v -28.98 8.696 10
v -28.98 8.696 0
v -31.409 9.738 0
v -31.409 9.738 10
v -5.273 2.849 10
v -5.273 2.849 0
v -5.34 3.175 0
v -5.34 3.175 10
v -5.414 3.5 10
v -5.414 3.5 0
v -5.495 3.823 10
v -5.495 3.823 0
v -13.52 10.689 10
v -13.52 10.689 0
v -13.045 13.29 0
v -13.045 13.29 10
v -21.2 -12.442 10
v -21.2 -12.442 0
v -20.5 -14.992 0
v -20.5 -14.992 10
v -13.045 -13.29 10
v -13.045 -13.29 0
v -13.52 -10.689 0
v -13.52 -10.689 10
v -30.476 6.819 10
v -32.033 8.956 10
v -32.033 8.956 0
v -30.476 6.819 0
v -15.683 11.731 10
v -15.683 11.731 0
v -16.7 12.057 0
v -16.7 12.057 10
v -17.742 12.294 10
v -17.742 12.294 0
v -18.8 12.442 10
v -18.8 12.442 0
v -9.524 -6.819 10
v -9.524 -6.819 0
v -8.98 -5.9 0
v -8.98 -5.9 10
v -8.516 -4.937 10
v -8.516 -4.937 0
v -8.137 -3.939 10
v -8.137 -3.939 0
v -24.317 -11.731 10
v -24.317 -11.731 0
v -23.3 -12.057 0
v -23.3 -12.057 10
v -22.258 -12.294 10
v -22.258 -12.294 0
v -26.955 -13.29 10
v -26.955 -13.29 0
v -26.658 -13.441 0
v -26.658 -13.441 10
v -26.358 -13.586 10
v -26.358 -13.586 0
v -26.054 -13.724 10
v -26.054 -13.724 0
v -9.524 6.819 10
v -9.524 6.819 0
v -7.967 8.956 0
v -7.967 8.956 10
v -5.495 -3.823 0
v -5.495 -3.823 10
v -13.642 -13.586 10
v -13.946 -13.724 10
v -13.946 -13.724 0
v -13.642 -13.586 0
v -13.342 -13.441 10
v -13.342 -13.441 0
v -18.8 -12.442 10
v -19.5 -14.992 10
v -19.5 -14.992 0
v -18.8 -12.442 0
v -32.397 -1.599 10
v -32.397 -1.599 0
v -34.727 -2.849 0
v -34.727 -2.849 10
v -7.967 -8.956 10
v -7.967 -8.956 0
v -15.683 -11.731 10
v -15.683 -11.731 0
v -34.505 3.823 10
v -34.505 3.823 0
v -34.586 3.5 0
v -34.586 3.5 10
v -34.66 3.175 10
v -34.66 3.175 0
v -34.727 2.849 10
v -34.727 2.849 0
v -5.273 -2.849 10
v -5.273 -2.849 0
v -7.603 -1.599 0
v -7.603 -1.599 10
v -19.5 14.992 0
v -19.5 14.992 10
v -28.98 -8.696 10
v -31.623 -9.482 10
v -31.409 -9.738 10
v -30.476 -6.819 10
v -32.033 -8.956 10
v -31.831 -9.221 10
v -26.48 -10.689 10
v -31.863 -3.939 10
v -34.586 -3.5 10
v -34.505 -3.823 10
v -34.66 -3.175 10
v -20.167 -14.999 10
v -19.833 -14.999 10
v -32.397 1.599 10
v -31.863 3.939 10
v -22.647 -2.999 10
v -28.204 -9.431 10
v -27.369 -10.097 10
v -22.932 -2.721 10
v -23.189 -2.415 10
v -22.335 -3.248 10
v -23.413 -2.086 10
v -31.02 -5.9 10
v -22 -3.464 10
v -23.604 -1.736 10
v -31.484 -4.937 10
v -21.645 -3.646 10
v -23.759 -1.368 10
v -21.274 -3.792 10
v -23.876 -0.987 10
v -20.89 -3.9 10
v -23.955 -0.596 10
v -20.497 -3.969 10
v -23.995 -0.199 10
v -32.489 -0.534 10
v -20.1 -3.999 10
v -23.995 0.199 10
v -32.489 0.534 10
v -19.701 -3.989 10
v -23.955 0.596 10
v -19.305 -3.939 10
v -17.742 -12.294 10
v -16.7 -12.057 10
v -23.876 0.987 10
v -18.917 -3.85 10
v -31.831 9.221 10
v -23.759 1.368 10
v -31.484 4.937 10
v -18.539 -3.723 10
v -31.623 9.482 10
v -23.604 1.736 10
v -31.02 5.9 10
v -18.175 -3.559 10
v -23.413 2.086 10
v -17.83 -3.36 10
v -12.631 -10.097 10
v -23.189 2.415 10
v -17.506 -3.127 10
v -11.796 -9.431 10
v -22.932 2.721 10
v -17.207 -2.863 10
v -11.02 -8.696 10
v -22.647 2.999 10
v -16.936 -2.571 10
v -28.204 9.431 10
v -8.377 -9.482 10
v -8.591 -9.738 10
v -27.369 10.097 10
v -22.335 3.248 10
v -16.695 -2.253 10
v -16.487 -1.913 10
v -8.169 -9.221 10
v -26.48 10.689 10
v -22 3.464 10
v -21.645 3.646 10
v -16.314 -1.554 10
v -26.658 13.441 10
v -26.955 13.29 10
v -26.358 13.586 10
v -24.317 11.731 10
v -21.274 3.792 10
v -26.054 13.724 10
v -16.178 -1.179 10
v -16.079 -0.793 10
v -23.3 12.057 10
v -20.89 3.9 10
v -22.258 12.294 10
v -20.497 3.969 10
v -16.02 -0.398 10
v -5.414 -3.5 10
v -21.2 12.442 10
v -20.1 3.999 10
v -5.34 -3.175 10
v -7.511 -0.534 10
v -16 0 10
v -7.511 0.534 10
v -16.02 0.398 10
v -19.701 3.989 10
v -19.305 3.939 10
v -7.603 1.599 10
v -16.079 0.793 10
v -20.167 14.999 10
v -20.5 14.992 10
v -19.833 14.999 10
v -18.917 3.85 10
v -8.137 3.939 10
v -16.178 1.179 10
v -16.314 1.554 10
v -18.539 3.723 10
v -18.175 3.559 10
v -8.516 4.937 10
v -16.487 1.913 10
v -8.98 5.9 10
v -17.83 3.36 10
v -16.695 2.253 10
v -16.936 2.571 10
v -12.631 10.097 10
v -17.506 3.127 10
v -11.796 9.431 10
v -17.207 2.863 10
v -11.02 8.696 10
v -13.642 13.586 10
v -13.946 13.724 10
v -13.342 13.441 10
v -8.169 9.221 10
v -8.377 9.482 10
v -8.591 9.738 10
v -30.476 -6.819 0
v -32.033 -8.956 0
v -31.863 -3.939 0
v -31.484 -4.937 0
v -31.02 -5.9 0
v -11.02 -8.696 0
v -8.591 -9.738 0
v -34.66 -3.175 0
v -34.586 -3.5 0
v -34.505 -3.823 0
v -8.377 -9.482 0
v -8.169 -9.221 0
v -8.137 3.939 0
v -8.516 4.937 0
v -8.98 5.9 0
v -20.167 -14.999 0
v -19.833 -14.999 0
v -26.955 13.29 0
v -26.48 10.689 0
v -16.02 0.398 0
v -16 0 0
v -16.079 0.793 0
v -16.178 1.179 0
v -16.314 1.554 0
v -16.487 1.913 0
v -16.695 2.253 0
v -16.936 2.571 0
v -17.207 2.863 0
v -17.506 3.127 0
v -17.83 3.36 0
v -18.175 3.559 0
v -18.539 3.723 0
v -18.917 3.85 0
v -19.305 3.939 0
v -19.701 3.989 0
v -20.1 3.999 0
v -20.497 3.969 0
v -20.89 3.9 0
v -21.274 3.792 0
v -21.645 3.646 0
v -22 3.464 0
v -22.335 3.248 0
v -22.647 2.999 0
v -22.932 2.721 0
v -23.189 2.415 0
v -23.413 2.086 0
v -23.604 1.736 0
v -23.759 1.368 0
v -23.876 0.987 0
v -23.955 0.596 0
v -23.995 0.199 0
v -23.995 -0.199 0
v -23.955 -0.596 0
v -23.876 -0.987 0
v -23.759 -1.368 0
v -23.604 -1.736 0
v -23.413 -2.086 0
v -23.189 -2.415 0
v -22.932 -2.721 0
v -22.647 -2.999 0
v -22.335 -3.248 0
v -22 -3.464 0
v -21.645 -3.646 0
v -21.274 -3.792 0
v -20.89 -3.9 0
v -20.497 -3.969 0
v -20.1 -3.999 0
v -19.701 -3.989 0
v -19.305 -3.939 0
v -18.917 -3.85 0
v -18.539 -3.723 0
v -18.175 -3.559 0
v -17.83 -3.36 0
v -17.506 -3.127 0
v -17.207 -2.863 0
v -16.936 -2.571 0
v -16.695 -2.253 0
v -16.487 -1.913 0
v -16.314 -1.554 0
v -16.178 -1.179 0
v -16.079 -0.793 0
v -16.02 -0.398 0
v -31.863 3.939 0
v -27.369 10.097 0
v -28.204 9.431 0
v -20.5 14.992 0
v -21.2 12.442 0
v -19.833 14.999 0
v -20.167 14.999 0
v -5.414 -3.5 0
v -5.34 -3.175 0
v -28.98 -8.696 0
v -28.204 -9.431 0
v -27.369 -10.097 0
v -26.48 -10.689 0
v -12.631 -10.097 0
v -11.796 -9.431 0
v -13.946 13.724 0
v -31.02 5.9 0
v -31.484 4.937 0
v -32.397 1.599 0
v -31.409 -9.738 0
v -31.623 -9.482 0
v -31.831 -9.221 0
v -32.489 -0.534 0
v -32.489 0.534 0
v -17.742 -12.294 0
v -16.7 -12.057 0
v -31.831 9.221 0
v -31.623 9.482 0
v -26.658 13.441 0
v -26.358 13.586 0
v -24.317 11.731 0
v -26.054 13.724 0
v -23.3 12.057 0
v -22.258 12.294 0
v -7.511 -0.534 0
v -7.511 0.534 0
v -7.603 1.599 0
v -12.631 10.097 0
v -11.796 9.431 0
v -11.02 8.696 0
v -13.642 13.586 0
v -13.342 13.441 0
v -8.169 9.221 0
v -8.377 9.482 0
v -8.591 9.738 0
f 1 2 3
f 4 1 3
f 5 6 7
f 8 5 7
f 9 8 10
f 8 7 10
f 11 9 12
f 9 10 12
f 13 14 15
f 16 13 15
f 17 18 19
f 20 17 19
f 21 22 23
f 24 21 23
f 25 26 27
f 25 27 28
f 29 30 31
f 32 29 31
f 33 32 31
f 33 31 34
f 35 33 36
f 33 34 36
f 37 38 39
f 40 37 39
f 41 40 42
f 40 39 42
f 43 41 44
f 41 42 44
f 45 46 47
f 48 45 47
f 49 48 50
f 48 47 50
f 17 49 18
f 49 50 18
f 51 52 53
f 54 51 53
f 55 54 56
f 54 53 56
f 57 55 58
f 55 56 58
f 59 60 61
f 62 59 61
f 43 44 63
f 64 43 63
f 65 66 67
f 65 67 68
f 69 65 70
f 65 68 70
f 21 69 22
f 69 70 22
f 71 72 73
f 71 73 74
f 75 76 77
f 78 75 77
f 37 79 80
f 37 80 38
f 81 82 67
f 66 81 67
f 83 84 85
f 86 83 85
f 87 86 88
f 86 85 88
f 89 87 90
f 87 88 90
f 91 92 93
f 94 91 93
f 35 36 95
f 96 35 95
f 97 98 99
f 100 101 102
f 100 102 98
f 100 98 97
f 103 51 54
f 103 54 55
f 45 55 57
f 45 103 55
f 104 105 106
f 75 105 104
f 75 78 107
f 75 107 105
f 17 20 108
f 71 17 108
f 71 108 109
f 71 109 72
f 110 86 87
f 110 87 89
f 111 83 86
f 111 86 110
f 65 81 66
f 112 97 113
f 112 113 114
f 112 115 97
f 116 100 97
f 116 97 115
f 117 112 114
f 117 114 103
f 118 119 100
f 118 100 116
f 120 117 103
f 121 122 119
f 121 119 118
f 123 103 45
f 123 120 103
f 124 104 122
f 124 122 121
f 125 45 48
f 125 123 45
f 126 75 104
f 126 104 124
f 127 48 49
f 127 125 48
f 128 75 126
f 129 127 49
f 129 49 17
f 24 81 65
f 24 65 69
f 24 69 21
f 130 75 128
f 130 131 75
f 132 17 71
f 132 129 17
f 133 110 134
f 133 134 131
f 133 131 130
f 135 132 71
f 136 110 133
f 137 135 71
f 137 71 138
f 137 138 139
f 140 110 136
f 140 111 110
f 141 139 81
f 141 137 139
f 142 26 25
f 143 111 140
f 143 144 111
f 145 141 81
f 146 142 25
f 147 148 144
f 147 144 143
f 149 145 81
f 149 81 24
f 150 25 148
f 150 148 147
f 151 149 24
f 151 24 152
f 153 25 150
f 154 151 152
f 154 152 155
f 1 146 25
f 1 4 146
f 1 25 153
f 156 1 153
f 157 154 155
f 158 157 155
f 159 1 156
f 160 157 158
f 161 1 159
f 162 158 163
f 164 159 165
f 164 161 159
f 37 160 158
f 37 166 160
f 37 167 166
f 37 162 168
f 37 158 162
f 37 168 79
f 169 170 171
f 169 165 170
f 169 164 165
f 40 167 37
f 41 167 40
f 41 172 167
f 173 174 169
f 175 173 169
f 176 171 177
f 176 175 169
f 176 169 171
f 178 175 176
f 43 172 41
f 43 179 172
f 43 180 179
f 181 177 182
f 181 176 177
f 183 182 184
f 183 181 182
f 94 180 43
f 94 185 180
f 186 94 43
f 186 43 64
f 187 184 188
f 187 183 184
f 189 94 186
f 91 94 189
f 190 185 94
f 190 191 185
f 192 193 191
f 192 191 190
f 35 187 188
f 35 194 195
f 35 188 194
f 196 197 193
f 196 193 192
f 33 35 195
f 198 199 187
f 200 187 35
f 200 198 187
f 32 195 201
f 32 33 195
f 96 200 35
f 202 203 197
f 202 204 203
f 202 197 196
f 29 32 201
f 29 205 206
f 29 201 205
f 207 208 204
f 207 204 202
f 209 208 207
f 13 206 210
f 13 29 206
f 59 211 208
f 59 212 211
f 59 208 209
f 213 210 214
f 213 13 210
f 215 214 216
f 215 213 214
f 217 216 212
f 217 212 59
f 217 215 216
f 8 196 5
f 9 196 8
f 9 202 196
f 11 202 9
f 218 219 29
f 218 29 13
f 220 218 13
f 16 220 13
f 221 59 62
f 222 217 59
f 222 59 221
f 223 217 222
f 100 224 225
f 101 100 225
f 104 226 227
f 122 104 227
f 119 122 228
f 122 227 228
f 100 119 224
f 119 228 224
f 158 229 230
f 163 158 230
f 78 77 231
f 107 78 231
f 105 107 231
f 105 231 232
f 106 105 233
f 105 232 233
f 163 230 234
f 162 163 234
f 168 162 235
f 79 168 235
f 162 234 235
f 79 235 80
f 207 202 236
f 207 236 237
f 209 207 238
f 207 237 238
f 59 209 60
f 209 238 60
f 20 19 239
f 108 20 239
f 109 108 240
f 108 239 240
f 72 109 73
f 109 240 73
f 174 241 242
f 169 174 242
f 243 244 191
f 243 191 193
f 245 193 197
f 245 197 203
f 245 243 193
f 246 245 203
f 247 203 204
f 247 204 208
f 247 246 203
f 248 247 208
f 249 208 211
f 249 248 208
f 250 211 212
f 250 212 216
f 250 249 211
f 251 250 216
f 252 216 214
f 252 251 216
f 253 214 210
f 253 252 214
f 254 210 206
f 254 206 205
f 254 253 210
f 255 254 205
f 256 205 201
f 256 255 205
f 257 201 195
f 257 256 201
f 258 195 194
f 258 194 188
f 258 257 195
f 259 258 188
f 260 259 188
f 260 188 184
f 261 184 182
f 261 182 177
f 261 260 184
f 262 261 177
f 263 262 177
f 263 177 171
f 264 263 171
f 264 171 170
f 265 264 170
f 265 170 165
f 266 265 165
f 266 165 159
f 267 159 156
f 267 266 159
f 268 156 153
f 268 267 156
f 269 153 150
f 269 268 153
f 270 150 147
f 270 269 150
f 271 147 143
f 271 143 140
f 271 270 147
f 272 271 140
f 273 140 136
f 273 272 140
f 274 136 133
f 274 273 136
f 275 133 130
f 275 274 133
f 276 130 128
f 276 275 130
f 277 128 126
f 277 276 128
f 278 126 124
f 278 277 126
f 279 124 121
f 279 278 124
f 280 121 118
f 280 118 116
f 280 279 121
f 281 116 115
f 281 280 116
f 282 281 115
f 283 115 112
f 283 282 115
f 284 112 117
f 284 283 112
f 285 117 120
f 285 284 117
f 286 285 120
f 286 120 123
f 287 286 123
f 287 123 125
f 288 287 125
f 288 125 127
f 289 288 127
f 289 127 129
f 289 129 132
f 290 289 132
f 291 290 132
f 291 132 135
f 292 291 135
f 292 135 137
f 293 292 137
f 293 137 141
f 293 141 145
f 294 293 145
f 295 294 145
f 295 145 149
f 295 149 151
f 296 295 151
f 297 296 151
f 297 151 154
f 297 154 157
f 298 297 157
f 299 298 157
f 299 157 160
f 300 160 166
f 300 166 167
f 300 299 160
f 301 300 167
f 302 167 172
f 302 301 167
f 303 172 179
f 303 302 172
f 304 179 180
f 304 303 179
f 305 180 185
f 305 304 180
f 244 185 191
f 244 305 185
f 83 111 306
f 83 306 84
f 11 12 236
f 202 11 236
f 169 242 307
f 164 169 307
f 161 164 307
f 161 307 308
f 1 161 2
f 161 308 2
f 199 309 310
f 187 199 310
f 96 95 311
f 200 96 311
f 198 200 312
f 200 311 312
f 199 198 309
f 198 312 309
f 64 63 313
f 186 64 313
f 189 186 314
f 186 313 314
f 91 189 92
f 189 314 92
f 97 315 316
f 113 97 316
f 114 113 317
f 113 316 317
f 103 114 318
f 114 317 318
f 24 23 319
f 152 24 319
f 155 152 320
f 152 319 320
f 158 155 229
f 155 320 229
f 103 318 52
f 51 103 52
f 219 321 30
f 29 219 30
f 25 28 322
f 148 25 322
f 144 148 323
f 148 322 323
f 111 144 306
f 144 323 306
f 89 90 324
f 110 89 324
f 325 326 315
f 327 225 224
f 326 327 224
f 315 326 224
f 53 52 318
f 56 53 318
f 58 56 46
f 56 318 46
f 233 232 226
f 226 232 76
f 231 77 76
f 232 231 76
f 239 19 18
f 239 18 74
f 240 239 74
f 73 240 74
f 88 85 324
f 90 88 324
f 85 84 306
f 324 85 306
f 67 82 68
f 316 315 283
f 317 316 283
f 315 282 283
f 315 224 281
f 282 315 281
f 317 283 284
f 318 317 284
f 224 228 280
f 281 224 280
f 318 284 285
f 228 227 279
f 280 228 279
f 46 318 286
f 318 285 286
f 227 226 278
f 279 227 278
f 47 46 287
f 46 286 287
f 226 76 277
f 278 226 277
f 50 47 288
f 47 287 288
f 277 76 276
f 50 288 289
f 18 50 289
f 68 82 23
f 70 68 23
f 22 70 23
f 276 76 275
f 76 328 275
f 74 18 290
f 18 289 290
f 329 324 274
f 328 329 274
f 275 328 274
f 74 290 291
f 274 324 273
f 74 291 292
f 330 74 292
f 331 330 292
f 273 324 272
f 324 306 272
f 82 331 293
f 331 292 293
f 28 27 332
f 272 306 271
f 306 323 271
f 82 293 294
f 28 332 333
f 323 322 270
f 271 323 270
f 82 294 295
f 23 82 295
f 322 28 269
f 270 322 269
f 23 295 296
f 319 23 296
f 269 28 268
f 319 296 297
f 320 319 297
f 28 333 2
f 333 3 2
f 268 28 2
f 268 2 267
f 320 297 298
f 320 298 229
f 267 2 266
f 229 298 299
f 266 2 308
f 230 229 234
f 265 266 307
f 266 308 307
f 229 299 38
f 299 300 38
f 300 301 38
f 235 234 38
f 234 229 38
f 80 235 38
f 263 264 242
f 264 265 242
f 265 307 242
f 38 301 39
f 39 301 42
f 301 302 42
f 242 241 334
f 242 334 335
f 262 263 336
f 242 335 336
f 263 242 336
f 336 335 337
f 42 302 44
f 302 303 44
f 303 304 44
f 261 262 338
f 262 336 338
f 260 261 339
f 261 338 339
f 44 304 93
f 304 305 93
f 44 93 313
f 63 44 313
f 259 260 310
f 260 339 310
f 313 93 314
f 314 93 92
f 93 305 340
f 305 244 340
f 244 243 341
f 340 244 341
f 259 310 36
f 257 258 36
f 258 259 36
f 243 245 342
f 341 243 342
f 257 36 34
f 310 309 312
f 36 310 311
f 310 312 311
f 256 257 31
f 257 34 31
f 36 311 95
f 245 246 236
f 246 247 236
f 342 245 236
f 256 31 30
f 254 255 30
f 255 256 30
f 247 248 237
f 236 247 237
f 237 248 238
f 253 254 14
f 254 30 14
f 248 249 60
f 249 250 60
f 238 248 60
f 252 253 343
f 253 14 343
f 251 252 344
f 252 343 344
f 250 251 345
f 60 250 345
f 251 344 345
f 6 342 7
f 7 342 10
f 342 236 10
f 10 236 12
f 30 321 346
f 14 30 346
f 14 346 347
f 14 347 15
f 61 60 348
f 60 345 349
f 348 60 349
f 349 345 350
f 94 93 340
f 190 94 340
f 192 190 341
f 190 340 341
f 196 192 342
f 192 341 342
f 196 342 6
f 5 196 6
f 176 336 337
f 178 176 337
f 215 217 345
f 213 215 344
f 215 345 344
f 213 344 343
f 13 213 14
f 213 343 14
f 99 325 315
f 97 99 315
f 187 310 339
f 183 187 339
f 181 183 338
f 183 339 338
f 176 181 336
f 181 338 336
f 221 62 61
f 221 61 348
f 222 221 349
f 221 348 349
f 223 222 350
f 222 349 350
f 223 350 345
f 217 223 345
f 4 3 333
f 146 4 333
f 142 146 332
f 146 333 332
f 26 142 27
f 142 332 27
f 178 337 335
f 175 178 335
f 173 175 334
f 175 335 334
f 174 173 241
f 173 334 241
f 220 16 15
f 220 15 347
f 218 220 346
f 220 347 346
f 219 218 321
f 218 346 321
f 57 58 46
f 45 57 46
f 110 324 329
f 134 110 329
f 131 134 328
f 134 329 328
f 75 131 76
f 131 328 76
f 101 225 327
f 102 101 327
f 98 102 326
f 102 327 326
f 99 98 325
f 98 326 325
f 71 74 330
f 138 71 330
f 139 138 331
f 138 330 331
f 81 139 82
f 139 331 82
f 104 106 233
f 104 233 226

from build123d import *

# Parameters (mm, degrees)
ESQUISSE2_R        = 4
BOSS_EXTRU_1_DEPTH = 10


with BuildPart() as part:
    # Esquisse2 → Boss.-Extru.1 (new body)
    with BuildSketch(Plane.XY):
        with BuildLine():
            ThreePointArc((-19.500069449, 14.991666667), (-20, 15), (-20.499930551, 14.991666667))
            Line((-20.499930551, 14.991666667), (-21.2, 12.442266675))
            ThreePointArc((-21.2, 12.442266675), (-22.781511674, 12.186598902), (-24.317334546, 11.730755407))
            Line((-24.317334546, 11.730755407), (-26.054218527, 13.723936681))
            ThreePointArc((-26.054218527, 13.723936681), (-26.508256087, 13.514533019), (-26.955062251, 13.290113208))
            Line((-26.955062251, 13.290113208), (-26.479659829, 10.689434433))
            ThreePointArc((-26.479659829, 10.689434433), (-27.793622523, 9.772893531), (-28.979568037, 8.695824163))
            Line((-28.979568037, 8.695824163), (-31.409255375, 9.738012723))
            ThreePointArc((-31.409255375, 9.738012723), (-31.727472237, 9.352347028), (-32.032658575, 8.956289836))
            Line((-32.032658575, 8.956289836), (-30.475943562, 6.819428605))
            ThreePointArc((-30.475943562, 6.819428605), (-31.262110849, 5.423546739), (-31.863287951, 3.938578296))
            Line((-31.863287951, 3.938578296), (-34.50454927, 3.823355916))
            ThreePointArc((-34.50454927, 3.823355916), (-34.623918683, 3.337814009), (-34.727039297, 2.84856342))
            Line((-34.727039297, 2.84856342), (-32.397338193, 1.598751306))
            ThreePointArc((-32.397338193, 1.598751306), (-32.5, 0), (-32.397338193, -1.598751306))
            Line((-32.397338193, -1.598751306), (-34.727039297, -2.84856342))
            ThreePointArc((-34.727039297, -2.84856342), (-34.623918683, -3.337814009), (-34.50454927, -3.823355916))
            Line((-34.50454927, -3.823355916), (-31.863287951, -3.938578296))
            ThreePointArc((-31.863287951, -3.938578296), (-31.262110849, -5.423546739), (-30.475943562, -6.819428605))
            Line((-30.475943562, -6.819428605), (-32.032658575, -8.956289836))
            ThreePointArc((-32.032658575, -8.956289836), (-31.727472237, -9.352347028), (-31.409255375, -9.738012723))
            Line((-31.409255375, -9.738012723), (-28.979568037, -8.695824163))
            ThreePointArc((-28.979568037, -8.695824163), (-27.793622523, -9.772893531), (-26.479659829, -10.689434433))
            Line((-26.479659829, -10.689434433), (-26.955062251, -13.290113208))
            ThreePointArc((-26.955062251, -13.290113208), (-26.508256087, -13.514533019), (-26.054218527, -13.723936681))
            Line((-26.054218527, -13.723936681), (-24.317334546, -11.730755407))
            ThreePointArc((-24.317334546, -11.730755407), (-22.781511674, -12.186598902), (-21.2, -12.442266675))
            Line((-21.2, -12.442266675), (-20.499930551, -14.991666667))
            ThreePointArc((-20.499930551, -14.991666667), (-20, -15), (-19.500069449, -14.991666667))
            Line((-19.500069449, -14.991666667), (-18.8, -12.442266675))
            ThreePointArc((-18.8, -12.442266675), (-17.218488326, -12.186598902), (-15.682665454, -11.730755407))
            Line((-15.682665454, -11.730755407), (-13.945781473, -13.723936681))
            ThreePointArc((-13.945781473, -13.723936681), (-13.491743913, -13.514533019), (-13.044937749, -13.290113208))
            Line((-13.044937749, -13.290113208), (-13.520340171, -10.689434433))
            ThreePointArc((-13.520340171, -10.689434433), (-12.206377477, -9.772893531), (-11.020431963, -8.695824163))
            Line((-11.020431963, -8.695824163), (-8.590744625, -9.738012723))
            ThreePointArc((-8.590744625, -9.738012723), (-8.272527763, -9.352347028), (-7.967341425, -8.956289836))
            Line((-7.967341425, -8.956289836), (-9.524056438, -6.819428605))
            ThreePointArc((-9.524056438, -6.819428605), (-8.737889151, -5.423546739), (-8.136712049, -3.938578296))
            Line((-8.136712049, -3.938578296), (-5.49545073, -3.823355916))
            ThreePointArc((-5.49545073, -3.823355916), (-5.376081317, -3.337814009), (-5.272960703, -2.84856342))
            Line((-5.272960703, -2.84856342), (-7.602661807, -1.598751306))
            ThreePointArc((-7.602661807, -1.598751306), (-7.5, 0), (-7.602661807, 1.598751306))
            Line((-7.602661807, 1.598751306), (-5.272960703, 2.84856342))
            ThreePointArc((-5.272960703, 2.84856342), (-5.376081317, 3.337814009), (-5.49545073, 3.823355916))
            Line((-5.49545073, 3.823355916), (-8.136712049, 3.938578296))
            ThreePointArc((-8.136712049, 3.938578296), (-8.737889151, 5.423546739), (-9.524056438, 6.819428605))
            Line((-9.524056438, 6.819428605), (-7.967341425, 8.956289836))
            ThreePointArc((-7.967341425, 8.956289836), (-8.272527763, 9.352347028), (-8.590744625, 9.738012723))
            Line((-8.590744625, 9.738012723), (-11.020431963, 8.695824163))
            ThreePointArc((-11.020431963, 8.695824163), (-12.206377477, 9.772893531), (-13.520340171, 10.689434433))
            Line((-13.520340171, 10.689434433), (-13.044937749, 13.290113208))
            ThreePointArc((-13.044937749, 13.290113208), (-13.491743913, 13.514533019), (-13.945781473, 13.723936681))
            Line((-13.945781473, 13.723936681), (-15.682665454, 11.730755407))
            ThreePointArc((-15.682665454, 11.730755407), (-17.218488326, 12.186598902), (-18.8, 12.442266675))
            Line((-18.8, 12.442266675), (-19.500069449, 14.991666667))
        make_face()
        with Locations((-20, 0)):
            Circle(ESQUISSE2_R, mode=Mode.SUBTRACT)
    extrude(amount=BOSS_EXTRU_1_DEPTH)


solid = part.part
